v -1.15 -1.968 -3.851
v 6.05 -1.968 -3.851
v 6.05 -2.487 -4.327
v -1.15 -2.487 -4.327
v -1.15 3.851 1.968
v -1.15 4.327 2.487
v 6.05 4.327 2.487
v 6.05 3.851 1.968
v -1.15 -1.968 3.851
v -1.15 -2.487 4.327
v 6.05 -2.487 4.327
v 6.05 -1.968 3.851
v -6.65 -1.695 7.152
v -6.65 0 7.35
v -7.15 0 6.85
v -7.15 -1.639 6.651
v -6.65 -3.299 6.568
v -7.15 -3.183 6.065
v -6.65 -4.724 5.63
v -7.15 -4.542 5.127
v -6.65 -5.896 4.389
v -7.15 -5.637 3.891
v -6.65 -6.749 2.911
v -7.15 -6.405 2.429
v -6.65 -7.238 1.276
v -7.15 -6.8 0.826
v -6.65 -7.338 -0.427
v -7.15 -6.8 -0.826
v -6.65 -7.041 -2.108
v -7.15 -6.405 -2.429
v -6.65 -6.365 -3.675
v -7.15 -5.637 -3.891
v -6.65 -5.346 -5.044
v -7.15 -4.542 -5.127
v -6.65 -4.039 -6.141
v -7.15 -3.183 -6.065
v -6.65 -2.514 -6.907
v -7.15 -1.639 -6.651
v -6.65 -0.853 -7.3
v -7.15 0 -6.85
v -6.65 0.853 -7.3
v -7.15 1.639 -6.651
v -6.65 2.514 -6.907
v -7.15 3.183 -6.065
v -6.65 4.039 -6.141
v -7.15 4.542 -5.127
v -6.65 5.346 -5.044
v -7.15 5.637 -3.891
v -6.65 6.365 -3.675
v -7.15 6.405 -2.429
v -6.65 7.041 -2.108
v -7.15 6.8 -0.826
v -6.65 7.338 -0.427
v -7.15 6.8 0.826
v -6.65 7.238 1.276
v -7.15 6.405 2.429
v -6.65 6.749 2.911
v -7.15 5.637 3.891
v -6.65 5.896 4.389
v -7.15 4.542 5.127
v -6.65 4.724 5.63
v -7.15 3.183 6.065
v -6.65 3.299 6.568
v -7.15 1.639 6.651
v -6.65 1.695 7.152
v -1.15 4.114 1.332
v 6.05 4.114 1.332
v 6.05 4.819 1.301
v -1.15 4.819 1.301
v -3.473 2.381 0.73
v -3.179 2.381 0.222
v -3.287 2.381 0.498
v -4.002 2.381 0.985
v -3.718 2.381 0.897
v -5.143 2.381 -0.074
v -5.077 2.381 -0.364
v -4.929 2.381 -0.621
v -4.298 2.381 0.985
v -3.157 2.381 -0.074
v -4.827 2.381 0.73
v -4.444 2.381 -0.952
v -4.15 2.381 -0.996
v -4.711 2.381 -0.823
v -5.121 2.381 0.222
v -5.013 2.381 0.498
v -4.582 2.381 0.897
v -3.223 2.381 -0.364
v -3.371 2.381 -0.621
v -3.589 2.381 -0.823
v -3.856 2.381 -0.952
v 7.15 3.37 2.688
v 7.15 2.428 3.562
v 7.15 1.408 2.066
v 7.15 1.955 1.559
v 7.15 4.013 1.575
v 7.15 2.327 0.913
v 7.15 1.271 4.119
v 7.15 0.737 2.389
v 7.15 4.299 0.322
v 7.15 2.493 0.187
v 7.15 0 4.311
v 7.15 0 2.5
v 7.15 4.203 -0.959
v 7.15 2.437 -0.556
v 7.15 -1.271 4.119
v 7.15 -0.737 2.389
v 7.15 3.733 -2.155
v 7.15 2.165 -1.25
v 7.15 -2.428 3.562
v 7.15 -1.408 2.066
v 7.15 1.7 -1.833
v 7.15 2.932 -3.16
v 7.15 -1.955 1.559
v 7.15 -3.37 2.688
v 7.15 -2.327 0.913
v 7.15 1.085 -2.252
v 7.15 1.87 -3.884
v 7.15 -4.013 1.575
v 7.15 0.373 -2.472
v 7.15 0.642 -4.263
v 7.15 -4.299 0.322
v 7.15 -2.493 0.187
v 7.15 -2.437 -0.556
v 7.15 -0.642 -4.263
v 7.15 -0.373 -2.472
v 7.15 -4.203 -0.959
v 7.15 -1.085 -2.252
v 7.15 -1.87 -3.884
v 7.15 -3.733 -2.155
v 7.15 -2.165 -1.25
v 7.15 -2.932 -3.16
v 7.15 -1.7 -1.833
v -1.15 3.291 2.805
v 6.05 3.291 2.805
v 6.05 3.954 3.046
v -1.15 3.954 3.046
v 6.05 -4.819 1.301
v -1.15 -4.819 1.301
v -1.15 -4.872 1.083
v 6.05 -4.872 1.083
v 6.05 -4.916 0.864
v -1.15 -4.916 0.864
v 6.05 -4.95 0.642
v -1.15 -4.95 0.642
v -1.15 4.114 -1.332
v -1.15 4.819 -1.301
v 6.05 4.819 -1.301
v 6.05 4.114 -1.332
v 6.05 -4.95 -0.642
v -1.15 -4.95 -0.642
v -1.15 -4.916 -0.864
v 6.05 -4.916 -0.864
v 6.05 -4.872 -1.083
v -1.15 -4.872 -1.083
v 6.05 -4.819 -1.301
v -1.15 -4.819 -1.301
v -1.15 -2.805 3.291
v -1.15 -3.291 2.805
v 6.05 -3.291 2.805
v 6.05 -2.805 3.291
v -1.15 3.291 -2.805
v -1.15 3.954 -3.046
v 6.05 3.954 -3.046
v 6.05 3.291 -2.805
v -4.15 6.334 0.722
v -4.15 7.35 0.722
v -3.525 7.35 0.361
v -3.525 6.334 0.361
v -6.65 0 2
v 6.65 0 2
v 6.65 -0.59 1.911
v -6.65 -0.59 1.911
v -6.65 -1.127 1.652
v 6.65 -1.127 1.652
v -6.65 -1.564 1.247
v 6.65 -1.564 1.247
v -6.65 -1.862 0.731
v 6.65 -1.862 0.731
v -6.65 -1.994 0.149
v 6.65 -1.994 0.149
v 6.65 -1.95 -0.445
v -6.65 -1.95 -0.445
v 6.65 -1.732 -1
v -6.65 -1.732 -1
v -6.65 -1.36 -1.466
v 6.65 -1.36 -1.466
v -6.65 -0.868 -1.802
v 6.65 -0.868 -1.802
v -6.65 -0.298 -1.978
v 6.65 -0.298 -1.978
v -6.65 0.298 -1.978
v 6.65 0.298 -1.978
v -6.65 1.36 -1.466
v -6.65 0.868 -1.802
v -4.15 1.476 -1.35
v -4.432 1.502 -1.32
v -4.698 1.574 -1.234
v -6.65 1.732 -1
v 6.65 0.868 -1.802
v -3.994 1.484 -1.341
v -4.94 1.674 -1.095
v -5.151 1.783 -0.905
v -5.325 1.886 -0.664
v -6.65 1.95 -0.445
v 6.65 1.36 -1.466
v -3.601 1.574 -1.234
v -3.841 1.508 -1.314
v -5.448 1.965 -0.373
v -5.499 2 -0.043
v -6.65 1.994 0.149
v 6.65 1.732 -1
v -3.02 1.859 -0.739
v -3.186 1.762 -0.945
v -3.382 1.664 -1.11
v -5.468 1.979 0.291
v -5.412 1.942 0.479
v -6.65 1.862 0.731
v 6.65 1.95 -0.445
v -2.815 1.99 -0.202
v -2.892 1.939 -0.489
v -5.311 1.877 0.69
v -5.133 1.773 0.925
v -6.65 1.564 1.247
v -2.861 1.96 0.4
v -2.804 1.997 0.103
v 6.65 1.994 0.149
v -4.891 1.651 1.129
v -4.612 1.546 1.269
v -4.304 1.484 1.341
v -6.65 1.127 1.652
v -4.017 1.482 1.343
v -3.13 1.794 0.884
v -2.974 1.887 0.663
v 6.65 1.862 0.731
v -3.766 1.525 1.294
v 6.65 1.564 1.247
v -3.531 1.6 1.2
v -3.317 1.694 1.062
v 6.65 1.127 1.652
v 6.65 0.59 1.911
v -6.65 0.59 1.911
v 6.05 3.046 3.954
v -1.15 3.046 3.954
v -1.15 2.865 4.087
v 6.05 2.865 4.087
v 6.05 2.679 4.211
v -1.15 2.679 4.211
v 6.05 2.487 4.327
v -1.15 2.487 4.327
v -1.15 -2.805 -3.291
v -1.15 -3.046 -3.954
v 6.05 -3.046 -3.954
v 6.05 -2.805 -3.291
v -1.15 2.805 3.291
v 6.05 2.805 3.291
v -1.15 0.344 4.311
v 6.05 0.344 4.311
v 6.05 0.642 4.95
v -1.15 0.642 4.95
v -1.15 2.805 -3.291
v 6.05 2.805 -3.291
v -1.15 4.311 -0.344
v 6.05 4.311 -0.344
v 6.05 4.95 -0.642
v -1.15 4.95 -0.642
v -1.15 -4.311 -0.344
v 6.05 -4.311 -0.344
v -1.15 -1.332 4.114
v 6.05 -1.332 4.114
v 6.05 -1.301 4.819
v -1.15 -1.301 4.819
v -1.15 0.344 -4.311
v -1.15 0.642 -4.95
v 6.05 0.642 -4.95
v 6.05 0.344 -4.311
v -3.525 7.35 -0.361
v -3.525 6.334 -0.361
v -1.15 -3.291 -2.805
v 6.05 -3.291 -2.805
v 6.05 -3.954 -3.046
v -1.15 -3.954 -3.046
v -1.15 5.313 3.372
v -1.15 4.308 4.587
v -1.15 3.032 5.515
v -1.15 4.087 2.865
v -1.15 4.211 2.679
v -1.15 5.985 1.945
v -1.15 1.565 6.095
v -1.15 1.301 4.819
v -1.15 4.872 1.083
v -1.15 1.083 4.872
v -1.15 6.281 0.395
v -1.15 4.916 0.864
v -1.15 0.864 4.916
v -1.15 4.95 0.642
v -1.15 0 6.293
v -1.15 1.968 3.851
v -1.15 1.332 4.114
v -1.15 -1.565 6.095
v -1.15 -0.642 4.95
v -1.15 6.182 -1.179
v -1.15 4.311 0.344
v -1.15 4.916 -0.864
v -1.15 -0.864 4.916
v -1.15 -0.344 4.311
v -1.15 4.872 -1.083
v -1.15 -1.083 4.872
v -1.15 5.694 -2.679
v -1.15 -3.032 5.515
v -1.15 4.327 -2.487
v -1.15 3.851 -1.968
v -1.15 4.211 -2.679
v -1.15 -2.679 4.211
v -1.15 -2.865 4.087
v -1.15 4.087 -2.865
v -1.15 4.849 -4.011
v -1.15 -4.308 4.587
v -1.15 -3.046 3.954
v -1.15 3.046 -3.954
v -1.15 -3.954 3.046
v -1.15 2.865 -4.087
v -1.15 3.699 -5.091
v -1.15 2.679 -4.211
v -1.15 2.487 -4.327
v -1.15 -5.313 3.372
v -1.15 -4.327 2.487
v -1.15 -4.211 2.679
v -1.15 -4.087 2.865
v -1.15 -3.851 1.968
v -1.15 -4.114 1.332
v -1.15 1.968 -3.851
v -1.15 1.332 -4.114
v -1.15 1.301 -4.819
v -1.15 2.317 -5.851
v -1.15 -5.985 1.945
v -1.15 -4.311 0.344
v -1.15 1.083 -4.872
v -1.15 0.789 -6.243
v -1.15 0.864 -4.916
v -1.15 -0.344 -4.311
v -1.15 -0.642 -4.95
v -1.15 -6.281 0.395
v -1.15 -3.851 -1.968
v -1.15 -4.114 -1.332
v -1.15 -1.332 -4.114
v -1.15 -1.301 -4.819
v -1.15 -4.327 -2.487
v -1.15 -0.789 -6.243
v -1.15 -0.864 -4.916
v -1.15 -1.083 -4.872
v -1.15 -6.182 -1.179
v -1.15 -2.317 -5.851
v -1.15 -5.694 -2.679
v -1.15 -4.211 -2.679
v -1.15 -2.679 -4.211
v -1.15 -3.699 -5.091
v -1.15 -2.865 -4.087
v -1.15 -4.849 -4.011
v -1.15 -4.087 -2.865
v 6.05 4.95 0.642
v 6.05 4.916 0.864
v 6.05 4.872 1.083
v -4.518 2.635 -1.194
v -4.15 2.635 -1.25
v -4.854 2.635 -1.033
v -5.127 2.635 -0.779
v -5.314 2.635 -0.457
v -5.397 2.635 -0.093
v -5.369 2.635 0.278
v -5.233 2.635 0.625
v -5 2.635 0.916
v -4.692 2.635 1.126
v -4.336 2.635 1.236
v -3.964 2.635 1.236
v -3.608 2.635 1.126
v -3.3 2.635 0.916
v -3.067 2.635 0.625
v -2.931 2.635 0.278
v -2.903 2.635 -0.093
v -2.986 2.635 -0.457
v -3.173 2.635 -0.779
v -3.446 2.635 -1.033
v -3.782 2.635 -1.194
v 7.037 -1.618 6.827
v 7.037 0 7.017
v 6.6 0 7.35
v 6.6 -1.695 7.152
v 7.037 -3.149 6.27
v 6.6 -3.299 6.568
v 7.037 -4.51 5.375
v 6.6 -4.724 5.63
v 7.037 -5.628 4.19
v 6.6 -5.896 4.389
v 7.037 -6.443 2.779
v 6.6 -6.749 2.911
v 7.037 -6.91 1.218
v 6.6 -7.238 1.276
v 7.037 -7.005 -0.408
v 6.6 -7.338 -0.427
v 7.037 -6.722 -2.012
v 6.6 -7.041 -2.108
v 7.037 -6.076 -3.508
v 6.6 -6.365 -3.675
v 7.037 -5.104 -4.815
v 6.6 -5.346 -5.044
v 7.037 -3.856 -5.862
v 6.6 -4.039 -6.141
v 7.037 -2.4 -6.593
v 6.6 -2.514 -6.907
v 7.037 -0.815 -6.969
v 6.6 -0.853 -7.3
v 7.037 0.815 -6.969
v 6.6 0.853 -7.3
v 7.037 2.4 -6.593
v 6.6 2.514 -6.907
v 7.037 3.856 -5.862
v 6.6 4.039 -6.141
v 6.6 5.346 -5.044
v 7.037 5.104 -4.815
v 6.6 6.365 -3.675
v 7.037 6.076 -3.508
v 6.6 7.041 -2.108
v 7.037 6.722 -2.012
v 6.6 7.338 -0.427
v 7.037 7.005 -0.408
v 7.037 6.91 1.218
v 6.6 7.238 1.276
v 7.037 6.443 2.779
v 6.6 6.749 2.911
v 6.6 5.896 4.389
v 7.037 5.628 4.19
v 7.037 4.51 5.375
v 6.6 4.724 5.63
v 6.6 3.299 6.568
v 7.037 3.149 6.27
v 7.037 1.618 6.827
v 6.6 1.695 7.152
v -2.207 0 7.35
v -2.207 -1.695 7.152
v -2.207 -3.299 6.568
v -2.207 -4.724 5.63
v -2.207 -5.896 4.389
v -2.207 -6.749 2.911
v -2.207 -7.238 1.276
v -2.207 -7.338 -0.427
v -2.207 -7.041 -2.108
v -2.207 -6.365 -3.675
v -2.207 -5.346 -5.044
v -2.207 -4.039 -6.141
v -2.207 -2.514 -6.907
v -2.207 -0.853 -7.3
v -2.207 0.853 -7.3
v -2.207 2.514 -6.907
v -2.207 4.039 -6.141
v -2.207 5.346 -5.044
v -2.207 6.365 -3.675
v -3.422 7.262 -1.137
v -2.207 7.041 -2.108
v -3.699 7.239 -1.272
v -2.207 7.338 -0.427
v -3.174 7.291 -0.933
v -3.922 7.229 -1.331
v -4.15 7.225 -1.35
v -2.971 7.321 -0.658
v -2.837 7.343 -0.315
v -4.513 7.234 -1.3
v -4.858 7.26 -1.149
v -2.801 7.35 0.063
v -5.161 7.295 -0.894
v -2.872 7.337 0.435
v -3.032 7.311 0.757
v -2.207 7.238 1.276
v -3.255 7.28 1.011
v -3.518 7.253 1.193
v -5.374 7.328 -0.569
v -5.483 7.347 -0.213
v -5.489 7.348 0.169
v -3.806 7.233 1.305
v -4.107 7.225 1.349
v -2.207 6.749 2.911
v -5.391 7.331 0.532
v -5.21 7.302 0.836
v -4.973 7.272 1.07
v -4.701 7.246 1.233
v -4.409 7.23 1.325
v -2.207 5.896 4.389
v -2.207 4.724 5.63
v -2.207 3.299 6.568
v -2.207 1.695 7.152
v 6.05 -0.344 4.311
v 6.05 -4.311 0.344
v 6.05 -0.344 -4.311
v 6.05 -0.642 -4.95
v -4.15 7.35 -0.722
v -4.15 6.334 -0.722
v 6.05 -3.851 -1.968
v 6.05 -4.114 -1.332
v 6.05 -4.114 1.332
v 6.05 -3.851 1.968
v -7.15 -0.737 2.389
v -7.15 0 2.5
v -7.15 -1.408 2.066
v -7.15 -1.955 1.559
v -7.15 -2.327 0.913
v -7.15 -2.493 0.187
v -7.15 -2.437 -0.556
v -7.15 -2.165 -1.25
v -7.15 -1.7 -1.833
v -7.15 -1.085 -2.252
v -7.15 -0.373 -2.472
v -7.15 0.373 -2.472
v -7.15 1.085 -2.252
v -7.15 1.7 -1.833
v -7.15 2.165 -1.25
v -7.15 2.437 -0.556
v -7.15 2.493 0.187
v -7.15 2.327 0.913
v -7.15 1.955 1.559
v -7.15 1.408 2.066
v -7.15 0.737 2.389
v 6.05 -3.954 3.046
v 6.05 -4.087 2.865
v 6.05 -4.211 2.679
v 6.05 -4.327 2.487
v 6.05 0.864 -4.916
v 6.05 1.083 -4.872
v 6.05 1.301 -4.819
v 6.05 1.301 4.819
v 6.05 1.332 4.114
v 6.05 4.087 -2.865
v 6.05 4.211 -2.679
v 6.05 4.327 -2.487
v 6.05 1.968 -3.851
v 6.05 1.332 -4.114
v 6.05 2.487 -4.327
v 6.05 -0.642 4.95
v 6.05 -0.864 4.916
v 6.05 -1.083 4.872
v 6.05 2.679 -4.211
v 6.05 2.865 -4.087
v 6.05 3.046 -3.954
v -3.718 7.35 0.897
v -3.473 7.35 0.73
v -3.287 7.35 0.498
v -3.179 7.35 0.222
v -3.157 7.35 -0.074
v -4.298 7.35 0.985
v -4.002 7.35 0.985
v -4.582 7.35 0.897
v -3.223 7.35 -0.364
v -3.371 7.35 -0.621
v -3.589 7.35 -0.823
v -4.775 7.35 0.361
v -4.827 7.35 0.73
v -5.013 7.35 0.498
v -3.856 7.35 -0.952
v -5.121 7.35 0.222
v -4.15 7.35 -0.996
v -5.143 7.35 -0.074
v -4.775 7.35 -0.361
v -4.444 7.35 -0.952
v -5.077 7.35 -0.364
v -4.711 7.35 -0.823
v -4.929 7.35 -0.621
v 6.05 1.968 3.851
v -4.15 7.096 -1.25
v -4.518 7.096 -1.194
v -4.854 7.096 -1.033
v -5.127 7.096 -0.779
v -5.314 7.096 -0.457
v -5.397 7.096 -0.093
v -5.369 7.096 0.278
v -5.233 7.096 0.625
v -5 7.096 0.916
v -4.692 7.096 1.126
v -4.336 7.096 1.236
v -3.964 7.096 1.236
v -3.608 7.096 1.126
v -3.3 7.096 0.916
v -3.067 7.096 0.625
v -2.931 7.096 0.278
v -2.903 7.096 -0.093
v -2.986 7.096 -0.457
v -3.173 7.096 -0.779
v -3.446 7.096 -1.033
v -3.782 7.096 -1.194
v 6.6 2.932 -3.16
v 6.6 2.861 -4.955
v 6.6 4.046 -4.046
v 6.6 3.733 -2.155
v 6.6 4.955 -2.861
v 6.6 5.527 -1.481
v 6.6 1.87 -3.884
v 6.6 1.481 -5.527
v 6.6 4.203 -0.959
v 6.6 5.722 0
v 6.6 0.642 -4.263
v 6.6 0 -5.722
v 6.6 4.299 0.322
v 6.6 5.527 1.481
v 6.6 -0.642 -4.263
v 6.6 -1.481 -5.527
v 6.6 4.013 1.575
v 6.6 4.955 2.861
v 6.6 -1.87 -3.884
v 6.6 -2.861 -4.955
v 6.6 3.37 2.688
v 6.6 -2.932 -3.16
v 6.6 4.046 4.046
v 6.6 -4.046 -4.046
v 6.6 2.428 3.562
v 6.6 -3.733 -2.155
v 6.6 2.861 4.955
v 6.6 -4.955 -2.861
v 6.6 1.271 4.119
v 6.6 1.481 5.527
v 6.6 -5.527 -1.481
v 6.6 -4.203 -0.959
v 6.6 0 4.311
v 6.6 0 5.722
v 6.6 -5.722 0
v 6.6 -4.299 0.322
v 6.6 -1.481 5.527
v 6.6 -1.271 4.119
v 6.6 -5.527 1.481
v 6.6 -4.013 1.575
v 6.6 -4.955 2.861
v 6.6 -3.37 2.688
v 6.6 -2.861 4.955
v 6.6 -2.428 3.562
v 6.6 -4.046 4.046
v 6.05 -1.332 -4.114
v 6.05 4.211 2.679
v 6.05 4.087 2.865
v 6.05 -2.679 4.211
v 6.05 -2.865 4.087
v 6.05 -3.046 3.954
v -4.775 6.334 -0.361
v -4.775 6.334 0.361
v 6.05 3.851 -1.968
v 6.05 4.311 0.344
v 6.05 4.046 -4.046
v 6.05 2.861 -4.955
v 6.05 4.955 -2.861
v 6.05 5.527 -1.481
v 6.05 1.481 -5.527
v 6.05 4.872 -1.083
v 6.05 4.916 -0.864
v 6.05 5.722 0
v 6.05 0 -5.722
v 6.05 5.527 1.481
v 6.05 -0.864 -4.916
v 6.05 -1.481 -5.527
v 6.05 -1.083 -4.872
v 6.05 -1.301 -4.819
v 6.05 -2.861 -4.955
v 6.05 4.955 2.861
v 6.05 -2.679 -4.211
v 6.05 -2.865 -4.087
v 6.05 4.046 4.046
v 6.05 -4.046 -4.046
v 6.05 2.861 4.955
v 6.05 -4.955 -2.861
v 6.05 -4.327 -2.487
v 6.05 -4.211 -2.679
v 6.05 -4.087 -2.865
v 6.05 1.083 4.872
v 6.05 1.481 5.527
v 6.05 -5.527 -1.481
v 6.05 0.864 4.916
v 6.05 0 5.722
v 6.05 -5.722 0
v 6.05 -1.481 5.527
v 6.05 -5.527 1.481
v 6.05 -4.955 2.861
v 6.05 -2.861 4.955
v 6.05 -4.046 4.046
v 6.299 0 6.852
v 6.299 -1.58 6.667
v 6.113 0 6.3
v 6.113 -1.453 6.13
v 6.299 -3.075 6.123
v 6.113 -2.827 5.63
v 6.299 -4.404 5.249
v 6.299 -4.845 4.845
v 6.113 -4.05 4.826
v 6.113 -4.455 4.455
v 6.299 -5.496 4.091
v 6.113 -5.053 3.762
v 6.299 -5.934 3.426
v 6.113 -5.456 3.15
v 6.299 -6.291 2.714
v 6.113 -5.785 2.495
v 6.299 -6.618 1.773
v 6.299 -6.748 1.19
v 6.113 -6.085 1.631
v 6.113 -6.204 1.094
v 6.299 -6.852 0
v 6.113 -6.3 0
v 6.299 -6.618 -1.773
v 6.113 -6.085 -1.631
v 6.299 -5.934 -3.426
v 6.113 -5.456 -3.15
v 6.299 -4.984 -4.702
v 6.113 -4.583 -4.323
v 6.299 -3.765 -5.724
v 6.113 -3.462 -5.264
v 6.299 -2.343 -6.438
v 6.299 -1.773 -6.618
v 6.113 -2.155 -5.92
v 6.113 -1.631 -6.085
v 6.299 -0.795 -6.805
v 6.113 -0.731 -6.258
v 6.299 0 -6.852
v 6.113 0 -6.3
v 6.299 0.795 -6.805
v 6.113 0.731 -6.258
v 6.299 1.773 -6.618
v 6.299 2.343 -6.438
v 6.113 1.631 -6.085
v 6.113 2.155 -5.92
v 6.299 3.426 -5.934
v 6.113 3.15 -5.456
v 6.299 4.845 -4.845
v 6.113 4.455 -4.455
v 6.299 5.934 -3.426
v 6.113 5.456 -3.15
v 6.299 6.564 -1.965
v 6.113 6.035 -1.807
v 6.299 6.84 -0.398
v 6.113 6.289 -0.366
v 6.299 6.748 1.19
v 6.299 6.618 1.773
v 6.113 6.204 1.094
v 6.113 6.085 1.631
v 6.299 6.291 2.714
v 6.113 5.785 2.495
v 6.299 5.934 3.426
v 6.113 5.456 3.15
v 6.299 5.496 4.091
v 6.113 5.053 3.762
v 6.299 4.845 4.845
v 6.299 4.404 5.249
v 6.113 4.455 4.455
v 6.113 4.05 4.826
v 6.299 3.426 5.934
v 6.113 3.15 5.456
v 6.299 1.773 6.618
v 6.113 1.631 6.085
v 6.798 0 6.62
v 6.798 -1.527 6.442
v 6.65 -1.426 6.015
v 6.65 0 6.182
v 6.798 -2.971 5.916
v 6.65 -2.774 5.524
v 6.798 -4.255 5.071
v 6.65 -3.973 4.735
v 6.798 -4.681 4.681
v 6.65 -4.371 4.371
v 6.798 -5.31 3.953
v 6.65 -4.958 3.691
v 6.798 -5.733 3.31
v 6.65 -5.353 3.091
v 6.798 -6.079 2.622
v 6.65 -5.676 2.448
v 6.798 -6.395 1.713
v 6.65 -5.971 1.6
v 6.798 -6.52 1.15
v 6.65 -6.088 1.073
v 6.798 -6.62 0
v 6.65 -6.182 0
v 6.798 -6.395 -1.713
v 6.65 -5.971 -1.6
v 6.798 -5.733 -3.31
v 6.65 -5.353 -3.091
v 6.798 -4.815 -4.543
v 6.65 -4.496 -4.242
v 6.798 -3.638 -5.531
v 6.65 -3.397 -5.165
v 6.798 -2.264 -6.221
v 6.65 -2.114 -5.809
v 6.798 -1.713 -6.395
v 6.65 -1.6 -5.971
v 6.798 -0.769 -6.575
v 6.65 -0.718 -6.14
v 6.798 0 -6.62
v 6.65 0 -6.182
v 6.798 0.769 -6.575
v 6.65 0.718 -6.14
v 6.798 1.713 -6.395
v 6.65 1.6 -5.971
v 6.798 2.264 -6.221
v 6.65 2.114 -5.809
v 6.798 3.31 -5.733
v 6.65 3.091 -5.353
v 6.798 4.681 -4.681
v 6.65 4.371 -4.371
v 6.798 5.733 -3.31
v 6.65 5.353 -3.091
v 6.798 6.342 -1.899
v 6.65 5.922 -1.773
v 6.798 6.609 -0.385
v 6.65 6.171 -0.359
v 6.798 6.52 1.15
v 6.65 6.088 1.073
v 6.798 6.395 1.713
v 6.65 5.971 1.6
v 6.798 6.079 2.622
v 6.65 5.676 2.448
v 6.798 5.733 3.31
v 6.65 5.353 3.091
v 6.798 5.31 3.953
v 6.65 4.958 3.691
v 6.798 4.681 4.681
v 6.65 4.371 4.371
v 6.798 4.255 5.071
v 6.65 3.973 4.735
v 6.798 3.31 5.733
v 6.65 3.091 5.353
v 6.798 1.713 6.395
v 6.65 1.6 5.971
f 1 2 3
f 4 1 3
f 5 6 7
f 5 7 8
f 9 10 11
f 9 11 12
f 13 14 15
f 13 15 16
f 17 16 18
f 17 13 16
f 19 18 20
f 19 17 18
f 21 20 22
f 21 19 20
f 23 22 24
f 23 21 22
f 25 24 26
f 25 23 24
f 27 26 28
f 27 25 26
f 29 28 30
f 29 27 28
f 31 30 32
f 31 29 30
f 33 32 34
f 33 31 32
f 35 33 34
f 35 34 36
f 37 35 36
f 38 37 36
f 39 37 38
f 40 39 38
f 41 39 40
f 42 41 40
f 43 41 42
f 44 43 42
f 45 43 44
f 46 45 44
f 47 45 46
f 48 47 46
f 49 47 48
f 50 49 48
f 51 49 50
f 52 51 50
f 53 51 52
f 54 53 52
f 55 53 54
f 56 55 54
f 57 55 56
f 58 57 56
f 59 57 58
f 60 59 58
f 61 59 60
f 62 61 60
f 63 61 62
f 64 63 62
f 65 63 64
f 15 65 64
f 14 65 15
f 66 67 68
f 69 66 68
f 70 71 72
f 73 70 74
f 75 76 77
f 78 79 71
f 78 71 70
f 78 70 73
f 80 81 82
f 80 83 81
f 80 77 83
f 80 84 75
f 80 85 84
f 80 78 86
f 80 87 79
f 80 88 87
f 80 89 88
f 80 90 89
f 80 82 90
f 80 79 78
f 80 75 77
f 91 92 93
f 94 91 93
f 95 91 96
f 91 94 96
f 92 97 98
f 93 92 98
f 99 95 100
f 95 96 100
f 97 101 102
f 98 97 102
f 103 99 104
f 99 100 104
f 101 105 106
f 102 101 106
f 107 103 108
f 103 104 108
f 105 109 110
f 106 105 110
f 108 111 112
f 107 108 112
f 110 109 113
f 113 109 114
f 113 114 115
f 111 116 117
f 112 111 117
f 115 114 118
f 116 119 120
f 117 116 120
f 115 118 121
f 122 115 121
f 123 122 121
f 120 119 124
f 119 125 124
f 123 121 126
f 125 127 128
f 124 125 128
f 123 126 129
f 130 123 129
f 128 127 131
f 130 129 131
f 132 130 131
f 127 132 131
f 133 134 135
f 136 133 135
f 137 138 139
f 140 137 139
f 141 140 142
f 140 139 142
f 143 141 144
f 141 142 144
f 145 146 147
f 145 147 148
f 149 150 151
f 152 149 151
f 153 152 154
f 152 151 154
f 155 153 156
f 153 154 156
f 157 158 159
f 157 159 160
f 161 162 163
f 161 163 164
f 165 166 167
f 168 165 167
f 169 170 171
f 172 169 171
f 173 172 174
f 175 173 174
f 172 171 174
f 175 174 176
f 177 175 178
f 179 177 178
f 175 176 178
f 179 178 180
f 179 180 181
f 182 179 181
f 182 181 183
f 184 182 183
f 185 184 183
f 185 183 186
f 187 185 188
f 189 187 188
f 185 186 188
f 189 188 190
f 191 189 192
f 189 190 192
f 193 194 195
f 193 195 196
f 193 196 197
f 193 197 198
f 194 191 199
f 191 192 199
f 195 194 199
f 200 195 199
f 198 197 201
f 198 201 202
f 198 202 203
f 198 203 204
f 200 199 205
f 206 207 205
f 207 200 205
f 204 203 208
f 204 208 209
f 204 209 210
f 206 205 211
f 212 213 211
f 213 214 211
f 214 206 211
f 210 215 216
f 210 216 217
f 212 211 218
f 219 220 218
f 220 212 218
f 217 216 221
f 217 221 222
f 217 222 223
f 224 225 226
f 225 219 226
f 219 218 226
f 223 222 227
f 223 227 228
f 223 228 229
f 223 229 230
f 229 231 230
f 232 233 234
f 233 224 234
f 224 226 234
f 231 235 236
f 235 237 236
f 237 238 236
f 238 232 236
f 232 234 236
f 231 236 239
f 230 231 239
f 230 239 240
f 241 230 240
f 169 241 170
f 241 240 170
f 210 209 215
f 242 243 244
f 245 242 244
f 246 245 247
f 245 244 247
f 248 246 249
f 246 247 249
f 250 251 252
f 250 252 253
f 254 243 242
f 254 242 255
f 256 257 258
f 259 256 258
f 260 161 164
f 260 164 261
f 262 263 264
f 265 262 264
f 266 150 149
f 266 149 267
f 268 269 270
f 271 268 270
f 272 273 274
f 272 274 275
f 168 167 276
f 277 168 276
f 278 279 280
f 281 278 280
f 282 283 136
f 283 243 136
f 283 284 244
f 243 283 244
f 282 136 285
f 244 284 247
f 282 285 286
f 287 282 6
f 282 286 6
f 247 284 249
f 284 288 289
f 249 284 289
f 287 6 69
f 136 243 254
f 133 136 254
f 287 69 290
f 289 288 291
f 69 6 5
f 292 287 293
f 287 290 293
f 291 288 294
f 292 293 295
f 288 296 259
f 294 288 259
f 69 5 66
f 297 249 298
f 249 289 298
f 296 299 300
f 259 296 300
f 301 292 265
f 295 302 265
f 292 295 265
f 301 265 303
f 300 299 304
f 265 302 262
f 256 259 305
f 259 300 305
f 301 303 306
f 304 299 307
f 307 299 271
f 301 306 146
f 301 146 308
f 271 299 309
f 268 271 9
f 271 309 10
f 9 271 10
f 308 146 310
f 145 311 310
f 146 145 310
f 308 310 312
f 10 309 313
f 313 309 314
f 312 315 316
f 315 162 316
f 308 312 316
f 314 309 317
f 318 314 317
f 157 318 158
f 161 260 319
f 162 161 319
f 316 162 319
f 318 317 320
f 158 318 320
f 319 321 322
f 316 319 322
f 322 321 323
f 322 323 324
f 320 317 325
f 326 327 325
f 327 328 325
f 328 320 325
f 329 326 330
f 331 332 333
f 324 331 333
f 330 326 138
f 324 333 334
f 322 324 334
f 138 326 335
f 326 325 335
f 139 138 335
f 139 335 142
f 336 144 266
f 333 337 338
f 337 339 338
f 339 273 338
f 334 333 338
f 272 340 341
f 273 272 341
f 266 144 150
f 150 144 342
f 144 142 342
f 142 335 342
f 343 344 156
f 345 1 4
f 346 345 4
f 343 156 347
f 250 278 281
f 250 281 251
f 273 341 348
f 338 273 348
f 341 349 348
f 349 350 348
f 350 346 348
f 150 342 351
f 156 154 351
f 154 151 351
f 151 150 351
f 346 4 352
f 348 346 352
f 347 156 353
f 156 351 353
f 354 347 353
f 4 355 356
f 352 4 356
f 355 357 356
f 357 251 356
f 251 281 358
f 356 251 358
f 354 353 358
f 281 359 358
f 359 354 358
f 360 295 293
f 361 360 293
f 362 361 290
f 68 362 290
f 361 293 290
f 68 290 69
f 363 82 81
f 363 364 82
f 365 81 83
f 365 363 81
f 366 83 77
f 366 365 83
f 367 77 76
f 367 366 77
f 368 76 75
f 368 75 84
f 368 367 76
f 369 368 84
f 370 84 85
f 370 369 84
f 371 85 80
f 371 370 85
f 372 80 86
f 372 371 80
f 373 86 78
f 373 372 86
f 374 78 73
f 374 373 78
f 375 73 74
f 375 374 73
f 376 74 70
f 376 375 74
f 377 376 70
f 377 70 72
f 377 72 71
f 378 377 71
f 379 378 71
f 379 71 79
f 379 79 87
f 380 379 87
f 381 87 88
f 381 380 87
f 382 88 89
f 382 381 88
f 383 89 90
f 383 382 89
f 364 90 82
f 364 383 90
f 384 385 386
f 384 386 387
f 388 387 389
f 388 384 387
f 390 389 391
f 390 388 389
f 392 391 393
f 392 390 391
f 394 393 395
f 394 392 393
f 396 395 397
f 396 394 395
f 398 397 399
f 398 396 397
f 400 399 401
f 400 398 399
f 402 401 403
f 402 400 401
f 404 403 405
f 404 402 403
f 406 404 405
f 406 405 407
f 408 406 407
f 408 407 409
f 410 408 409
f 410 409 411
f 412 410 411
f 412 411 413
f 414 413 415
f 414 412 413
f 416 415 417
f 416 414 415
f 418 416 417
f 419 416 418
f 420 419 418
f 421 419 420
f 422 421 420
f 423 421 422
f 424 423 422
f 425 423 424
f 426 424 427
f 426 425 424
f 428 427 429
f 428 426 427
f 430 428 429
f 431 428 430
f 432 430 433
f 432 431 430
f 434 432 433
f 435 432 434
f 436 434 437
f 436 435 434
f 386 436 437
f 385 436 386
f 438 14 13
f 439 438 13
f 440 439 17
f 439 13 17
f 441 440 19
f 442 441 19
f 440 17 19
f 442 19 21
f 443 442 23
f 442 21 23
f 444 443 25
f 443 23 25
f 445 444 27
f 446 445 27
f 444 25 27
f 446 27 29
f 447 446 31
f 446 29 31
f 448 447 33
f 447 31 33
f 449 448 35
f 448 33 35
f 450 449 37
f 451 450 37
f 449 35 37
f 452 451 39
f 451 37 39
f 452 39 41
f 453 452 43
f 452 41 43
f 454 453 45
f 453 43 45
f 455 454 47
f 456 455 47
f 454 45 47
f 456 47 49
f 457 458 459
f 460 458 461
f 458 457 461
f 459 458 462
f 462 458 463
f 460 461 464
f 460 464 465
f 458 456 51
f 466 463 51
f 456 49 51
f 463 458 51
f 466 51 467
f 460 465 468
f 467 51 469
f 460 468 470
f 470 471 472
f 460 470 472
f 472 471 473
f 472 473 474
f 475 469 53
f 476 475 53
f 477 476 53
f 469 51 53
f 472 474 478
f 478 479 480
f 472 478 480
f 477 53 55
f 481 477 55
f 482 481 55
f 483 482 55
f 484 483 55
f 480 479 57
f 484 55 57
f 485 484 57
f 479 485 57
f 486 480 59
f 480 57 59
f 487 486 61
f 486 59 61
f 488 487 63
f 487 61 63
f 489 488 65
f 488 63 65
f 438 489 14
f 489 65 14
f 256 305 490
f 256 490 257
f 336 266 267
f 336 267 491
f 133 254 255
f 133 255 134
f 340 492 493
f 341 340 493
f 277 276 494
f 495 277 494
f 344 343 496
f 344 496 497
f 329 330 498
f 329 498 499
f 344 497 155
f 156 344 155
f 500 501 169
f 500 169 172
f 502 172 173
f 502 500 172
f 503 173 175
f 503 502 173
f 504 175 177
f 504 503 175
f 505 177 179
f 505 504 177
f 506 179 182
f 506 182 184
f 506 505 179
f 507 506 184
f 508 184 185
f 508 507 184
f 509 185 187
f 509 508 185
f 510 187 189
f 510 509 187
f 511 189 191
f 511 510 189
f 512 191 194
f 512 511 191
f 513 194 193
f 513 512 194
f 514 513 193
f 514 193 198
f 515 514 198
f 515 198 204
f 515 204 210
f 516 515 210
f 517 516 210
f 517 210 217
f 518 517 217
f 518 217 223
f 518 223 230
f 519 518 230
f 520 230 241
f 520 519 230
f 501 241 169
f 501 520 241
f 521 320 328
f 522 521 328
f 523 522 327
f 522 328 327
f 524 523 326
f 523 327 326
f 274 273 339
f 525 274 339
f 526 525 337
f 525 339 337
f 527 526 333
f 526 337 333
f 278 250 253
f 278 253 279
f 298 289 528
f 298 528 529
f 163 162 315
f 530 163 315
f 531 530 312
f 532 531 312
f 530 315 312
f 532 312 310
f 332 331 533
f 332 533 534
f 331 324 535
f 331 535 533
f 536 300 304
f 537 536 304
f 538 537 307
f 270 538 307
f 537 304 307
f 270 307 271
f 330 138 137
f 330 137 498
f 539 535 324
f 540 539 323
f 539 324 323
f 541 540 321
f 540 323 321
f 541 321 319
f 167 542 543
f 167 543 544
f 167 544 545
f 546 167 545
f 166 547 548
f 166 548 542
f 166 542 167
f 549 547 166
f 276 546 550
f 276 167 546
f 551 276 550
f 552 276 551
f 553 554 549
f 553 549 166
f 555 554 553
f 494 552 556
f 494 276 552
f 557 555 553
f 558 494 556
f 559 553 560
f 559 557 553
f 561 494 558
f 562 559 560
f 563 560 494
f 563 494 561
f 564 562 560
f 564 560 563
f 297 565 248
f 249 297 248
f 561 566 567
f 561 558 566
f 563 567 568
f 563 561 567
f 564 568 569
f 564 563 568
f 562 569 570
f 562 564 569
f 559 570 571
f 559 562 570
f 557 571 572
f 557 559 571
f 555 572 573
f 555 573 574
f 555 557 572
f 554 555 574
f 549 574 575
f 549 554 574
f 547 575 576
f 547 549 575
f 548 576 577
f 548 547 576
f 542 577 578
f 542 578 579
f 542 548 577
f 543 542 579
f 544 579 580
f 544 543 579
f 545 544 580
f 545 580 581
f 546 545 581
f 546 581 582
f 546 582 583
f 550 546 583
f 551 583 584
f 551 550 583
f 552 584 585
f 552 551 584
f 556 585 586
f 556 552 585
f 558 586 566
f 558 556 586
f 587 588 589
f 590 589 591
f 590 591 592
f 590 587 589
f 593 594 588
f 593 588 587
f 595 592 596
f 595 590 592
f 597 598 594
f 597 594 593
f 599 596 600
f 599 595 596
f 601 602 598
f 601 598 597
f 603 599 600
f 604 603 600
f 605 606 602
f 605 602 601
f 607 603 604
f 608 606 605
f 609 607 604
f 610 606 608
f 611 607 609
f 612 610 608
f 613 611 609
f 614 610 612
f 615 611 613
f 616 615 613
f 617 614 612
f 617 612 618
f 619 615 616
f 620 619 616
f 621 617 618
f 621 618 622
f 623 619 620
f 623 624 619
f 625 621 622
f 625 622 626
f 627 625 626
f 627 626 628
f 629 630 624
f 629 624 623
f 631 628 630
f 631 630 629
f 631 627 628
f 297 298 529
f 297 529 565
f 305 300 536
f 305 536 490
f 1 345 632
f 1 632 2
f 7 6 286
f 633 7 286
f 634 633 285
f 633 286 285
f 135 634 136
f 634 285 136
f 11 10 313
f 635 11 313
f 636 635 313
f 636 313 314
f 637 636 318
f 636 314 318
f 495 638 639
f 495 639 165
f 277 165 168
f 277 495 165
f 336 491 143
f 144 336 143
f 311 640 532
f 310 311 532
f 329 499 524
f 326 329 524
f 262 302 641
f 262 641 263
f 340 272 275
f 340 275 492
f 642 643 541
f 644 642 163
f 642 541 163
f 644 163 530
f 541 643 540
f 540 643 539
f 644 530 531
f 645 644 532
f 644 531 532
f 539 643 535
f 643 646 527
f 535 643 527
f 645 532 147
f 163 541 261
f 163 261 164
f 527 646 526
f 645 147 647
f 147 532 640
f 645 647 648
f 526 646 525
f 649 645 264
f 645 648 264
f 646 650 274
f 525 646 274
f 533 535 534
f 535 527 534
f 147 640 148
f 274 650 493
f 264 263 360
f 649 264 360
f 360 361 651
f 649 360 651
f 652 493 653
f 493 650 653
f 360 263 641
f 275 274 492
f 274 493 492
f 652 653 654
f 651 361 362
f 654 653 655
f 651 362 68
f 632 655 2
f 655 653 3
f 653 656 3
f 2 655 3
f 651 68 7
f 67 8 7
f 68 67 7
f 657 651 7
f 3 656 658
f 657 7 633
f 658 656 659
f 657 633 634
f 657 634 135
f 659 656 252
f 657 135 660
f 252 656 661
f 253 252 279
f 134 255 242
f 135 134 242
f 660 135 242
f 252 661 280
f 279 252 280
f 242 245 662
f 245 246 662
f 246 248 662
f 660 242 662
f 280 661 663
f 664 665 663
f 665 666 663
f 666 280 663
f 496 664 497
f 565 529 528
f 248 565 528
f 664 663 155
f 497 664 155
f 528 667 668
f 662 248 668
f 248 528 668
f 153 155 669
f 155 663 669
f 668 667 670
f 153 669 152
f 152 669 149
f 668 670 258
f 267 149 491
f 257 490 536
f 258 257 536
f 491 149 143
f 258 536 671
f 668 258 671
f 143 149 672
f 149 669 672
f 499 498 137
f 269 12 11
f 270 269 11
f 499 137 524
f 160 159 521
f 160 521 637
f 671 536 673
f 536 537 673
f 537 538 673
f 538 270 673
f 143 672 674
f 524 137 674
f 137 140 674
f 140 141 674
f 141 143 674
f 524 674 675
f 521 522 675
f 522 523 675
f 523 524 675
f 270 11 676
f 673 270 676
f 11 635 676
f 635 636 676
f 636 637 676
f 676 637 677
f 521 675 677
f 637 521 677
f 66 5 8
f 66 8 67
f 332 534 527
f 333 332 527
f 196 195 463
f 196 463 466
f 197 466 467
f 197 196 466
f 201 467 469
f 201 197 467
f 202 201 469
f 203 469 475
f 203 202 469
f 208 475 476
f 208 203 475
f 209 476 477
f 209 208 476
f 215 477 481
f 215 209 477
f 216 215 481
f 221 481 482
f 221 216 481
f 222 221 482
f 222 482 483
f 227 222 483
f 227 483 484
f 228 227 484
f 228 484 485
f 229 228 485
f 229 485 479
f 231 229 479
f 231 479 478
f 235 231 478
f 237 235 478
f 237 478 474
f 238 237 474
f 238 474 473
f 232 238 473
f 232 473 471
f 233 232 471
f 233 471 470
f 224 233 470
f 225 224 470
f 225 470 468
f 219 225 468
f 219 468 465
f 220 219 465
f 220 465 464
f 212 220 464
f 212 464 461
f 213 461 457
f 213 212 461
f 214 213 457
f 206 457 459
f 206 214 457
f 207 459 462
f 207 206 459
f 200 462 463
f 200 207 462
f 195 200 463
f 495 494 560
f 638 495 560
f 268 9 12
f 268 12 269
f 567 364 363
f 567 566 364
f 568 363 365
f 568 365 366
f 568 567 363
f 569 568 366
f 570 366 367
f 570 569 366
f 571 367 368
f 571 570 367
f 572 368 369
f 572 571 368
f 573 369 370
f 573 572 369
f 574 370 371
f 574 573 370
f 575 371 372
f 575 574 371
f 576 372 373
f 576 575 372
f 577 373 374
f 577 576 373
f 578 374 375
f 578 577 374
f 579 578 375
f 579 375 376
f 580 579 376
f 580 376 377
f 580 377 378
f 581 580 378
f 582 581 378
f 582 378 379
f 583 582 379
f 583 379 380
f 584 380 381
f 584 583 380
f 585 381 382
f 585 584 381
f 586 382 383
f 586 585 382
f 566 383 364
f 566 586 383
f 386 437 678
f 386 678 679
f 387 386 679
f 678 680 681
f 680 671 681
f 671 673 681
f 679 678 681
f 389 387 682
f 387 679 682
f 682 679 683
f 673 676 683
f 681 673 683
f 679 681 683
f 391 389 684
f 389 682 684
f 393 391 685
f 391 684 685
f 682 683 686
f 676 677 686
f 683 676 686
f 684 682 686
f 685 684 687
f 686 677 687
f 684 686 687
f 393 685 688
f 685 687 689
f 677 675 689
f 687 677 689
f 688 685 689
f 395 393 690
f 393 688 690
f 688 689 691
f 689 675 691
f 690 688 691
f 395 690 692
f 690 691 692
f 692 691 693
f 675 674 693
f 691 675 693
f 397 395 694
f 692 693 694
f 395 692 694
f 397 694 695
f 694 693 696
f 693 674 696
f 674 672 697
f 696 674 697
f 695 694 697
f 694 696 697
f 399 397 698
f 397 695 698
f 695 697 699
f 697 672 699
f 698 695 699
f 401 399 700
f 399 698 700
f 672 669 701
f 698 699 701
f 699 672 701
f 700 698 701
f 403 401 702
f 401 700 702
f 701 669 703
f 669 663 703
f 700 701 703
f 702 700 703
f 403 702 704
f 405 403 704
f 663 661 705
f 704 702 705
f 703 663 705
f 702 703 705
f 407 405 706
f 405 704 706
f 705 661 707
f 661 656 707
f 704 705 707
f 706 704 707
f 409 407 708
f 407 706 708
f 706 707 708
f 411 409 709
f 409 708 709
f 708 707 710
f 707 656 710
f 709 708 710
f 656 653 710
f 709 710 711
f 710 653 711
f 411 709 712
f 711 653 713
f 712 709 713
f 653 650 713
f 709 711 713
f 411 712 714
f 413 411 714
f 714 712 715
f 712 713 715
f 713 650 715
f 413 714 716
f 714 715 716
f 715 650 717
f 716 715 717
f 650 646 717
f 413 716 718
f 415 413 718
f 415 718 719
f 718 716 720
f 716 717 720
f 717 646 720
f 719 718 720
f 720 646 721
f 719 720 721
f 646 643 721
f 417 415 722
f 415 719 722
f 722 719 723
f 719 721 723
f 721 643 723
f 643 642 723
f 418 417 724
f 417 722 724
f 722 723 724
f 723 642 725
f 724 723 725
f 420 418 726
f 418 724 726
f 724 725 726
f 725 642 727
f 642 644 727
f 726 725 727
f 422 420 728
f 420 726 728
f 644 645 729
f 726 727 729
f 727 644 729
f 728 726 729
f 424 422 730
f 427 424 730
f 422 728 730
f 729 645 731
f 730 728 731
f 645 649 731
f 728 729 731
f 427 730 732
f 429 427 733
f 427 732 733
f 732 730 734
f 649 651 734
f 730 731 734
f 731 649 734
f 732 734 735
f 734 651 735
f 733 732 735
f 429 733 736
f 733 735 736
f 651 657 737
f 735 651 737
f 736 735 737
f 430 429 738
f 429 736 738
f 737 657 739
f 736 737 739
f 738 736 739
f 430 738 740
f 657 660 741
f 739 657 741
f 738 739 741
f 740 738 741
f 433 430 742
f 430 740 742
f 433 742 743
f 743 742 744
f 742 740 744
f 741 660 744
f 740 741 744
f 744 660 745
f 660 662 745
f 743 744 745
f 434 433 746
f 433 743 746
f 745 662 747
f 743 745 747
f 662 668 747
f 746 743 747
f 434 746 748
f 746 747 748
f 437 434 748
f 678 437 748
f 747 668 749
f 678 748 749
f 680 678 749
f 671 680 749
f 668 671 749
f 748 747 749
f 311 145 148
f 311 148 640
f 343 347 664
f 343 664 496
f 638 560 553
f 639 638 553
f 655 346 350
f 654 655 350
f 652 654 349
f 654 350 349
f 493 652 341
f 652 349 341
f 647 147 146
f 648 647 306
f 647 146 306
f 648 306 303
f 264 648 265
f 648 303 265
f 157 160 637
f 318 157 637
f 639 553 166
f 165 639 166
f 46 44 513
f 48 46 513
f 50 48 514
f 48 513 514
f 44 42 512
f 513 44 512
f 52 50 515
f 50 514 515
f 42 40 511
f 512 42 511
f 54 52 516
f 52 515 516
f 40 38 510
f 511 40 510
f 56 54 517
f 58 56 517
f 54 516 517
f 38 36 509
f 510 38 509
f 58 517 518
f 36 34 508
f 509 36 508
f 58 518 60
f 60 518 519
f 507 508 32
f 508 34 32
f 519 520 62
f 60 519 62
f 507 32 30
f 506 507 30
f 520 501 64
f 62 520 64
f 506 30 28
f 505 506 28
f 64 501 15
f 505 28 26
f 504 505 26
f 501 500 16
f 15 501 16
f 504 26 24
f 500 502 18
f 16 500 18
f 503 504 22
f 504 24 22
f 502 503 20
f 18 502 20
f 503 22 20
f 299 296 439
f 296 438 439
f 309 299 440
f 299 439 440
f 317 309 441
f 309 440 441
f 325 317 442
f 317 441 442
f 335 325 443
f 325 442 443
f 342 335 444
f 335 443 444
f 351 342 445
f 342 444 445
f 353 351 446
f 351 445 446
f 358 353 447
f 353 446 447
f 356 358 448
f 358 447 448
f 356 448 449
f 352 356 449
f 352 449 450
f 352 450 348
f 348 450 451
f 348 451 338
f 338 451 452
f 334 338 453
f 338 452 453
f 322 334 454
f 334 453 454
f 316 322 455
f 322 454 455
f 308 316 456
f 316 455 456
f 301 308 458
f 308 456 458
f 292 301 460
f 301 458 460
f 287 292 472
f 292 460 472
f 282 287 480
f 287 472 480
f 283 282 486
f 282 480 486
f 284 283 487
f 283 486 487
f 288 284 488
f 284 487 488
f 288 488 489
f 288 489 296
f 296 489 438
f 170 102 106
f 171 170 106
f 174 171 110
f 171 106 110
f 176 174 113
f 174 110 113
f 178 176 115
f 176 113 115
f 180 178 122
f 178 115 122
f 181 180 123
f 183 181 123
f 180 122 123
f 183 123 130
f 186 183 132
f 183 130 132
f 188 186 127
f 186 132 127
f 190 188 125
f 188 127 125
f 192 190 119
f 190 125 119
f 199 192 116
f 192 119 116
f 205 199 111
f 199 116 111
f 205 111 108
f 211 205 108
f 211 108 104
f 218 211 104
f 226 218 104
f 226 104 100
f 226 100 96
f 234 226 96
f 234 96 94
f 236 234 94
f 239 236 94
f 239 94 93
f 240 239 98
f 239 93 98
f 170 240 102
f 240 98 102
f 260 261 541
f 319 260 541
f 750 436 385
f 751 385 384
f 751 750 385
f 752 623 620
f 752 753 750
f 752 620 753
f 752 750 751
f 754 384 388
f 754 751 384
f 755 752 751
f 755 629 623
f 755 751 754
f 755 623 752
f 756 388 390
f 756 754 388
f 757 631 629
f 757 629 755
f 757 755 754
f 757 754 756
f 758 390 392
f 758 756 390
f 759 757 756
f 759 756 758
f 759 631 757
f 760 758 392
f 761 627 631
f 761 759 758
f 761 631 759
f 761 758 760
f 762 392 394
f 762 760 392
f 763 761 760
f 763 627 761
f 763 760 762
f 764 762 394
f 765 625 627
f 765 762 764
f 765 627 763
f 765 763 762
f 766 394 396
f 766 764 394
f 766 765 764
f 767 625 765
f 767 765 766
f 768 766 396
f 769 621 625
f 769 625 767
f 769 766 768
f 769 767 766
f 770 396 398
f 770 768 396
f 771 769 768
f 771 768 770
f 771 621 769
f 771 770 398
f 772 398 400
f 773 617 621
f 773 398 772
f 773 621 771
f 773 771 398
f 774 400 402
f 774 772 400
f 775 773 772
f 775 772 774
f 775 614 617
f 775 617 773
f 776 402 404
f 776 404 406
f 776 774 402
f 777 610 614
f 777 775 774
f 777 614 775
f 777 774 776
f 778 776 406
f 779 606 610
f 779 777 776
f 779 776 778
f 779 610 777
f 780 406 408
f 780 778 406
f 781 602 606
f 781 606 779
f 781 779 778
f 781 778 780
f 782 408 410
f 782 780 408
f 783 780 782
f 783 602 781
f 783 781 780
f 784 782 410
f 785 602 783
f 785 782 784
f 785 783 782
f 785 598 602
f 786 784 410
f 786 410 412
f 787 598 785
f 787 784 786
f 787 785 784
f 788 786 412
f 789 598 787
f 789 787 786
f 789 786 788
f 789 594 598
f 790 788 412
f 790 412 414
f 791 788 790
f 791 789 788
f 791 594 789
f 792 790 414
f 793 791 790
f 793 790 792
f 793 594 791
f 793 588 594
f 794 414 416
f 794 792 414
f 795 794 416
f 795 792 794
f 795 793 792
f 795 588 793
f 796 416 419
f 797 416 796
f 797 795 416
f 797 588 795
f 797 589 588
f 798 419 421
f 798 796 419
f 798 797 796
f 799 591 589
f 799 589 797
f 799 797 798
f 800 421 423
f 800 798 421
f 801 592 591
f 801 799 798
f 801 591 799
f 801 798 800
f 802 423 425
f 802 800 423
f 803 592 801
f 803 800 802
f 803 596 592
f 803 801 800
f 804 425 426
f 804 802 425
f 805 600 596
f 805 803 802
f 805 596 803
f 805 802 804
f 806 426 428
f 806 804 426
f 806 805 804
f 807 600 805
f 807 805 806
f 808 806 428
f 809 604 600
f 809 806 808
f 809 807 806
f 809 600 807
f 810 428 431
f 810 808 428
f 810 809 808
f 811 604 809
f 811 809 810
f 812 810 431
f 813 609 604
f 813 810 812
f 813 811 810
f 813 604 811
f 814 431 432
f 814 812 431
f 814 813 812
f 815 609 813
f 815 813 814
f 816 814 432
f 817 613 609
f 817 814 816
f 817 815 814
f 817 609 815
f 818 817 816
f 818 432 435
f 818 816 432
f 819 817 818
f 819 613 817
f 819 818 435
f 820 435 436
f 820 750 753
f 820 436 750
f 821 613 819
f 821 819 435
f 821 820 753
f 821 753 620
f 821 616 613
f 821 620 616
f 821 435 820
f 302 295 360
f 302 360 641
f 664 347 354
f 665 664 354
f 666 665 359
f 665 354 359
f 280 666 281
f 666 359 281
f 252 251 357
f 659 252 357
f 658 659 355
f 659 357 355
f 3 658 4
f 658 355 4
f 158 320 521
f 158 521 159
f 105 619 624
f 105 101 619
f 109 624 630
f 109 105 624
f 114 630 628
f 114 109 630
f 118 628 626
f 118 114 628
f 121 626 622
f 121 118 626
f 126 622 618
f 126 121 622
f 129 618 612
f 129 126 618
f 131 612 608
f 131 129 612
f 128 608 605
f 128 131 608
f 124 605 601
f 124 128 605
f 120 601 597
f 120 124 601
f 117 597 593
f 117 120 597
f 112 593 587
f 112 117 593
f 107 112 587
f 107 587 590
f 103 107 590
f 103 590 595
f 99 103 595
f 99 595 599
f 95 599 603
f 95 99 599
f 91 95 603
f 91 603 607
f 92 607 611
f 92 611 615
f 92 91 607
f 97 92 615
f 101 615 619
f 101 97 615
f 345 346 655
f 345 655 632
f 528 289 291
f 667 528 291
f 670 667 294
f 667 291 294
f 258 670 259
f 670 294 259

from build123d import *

# Parameters (mm, degrees)
SKETCH4_R          = 5.15
SKETCH4_R_2        = 4.99125
CUT_EXTRUDE2_DEPTH = 7.2
CUT_EXTRUDE1_DEPTH = 7.2
CIRPATTERN1_COUNT  = 16
SKETCH6_R          = 1.35
CUT_EXTRUDE3_DEPTH = 13.616160272
CUT_EXTRUDE4_DEPTH = 1.016
CHAMFER1_SIZE      = 0.5


with BuildPart() as part:
    # Sketch1 → Revolve1 (revolve)
    with BuildSketch(Plane.XY, mode=Mode.PRIVATE) as revolve1_sk:
        with BuildLine():
            Line((-7.15, 2), (7.15, 2))
            Line((7.15, 2), (7.15, 7.35))
            Line((7.15, 7.35), (6.6, 7.35))
            ThreePointArc((6.6, 7.35), (6.191212109, 6.580934734), (6.05, 5.7215))
            Line((6.05, 5.7215), (6.05, 5.15))
            Line((6.05, 5.15), (-1.15, 5.15))
            Line((-1.15, 5.15), (-1.15, 6.293))
            Line((-1.15, 6.293), (-2.207, 7.35))
            Line((-2.207, 7.35), (-7.15, 7.35))
            Line((-7.15, 7.35), (-7.15, 2))
        make_face()
    revolve(revolve1_sk.sketch.rotate(Axis((-7.15, 0, 0), (1, 0, 0)), 90), axis=Axis((-7.15, 0, 0), (1, 0, 0)))

    # Sketch4 → Cut-Extrude2 (cut)
    with BuildSketch(Plane(origin=(-1.15, 0, 0), x_dir=(0, 0, -1), z_dir=(1, 0, 0))):
        Circle(SKETCH4_R)
        Circle(SKETCH4_R_2, mode=Mode.SUBTRACT)
    extrude(amount=CUT_EXTRUDE2_DEPTH, mode=Mode.SUBTRACT)

    # Sketch3 → Cut-Extrude1 (cut)
    with BuildSketch(Plane(origin=(-1.15, 0, 0), x_dir=(0, 0, -1), z_dir=(1, 0, 0))):
        with BuildLine():
            Line((-0.642006023, 4.949788362), (-0.344037701, 4.310793234))
            Line((-0.344037701, 4.310793234), (0.344037701, 4.310793234))
            Line((0.344037701, 4.310793234), (0.642006023, 4.949788362))
            ThreePointArc((0.642006023, 4.949788362), (0, 4.99125), (-0.642006023, 4.949788362))
        make_face()
    cut_extrude1 = extrude(amount=CUT_EXTRUDE1_DEPTH, mode=Mode.SUBTRACT)

    # CirPattern1: Cut-Extrude1 ×16 about axis
    cirpattern1_axis = Axis((0, 0, 0), (1, 0, 0))
    for i in range(1, CIRPATTERN1_COUNT):
        add(cut_extrude1.rotate(cirpattern1_axis, i * 360 / CIRPATTERN1_COUNT), mode=Mode.SUBTRACT)

    # Sketch6 → Cut-Extrude3 (cut, through all)
    with BuildSketch(Plane(origin=(0, 0, 0), x_dir=(1, 0, 0), z_dir=(0, 1, 0))):
        with Locations(Location((-4.15, 0, 0), (0, 0, 90))):
            Circle(SKETCH6_R)
    extrude(amount=CUT_EXTRUDE3_DEPTH, mode=Mode.SUBTRACT)

    # Chamfer1
    chamfer1_edges = [part.edges().sort_by_distance(p)[0] for p in [
        (-7.15, 0, -7.35),
        (-7.15, 0, -2),
        (7.15, 0, -2),
    ]]
    chamfer(chamfer1_edges, length=CHAMFER1_SIZE)

    # Sketch9 → Cut-Revolve1 (revolve, cut)
    with BuildSketch(Plane.XY, mode=Mode.PRIVATE) as cut_revolve1_sk:
        with BuildLine():
            Line((7.15, 4.310793234), (7.15, 7.35))
            Line((7.15, 7.35), (6.802186426, 7.615185187))
            Line((6.802186426, 7.615185187), (6.6, 7.35))
            Line((6.6, 7.35), (7.037375657, 7.01652956))
            ThreePointArc((7.037375657, 7.01652956), (6.712295889, 6.404946967), (6.6, 5.7215))
            Line((6.6, 5.7215), (6.6, 4.310793234))
            Line((6.6, 4.310793234), (7.15, 4.310793234))
        make_face()
    revolve(cut_revolve1_sk.sketch.rotate(Axis((-7.15, 0, 0), (1, 0, 0)), 90), axis=Axis((-7.15, 0, 0), (1, 0, 0)), mode=Mode.SUBTRACT)


with BuildPart() as body_2:
    # Sketch7 → Revolve2 (revolve)
    with BuildSketch(Plane.XY, mode=Mode.PRIVATE) as revolve2_sk:
        Polygon((-5.146, 7.35), (-4.15, 7.35), (-4.15, 2.381), (-5.146, 2.381), (-5.4, 2.635), (-5.4, 7.096), align=None)
    revolve(revolve2_sk.sketch.rotate(Axis((-4.15, 2.381, 0), (0, 1, 0)), 270), axis=Axis((-4.15, 2.381, 0), (0, 1, 0)))

    # Sketch8 → Cut-Extrude4 (cut)
    with BuildSketch(Plane(origin=(0, 7.35, 0), x_dir=(1, 0, 0), z_dir=(0, 1, 0))):
        Polygon((-4.15, 0.721687836), (-4.775, 0.360843918), (-4.775, -0.360843918), (-4.15, -0.721687836), (-3.525, -0.360843918), (-3.525, 0.360843918), align=None)
    extrude(amount=-CUT_EXTRUDE4_DEPTH, mode=Mode.SUBTRACT)


solid = Compound([part.part, body_2.part])
